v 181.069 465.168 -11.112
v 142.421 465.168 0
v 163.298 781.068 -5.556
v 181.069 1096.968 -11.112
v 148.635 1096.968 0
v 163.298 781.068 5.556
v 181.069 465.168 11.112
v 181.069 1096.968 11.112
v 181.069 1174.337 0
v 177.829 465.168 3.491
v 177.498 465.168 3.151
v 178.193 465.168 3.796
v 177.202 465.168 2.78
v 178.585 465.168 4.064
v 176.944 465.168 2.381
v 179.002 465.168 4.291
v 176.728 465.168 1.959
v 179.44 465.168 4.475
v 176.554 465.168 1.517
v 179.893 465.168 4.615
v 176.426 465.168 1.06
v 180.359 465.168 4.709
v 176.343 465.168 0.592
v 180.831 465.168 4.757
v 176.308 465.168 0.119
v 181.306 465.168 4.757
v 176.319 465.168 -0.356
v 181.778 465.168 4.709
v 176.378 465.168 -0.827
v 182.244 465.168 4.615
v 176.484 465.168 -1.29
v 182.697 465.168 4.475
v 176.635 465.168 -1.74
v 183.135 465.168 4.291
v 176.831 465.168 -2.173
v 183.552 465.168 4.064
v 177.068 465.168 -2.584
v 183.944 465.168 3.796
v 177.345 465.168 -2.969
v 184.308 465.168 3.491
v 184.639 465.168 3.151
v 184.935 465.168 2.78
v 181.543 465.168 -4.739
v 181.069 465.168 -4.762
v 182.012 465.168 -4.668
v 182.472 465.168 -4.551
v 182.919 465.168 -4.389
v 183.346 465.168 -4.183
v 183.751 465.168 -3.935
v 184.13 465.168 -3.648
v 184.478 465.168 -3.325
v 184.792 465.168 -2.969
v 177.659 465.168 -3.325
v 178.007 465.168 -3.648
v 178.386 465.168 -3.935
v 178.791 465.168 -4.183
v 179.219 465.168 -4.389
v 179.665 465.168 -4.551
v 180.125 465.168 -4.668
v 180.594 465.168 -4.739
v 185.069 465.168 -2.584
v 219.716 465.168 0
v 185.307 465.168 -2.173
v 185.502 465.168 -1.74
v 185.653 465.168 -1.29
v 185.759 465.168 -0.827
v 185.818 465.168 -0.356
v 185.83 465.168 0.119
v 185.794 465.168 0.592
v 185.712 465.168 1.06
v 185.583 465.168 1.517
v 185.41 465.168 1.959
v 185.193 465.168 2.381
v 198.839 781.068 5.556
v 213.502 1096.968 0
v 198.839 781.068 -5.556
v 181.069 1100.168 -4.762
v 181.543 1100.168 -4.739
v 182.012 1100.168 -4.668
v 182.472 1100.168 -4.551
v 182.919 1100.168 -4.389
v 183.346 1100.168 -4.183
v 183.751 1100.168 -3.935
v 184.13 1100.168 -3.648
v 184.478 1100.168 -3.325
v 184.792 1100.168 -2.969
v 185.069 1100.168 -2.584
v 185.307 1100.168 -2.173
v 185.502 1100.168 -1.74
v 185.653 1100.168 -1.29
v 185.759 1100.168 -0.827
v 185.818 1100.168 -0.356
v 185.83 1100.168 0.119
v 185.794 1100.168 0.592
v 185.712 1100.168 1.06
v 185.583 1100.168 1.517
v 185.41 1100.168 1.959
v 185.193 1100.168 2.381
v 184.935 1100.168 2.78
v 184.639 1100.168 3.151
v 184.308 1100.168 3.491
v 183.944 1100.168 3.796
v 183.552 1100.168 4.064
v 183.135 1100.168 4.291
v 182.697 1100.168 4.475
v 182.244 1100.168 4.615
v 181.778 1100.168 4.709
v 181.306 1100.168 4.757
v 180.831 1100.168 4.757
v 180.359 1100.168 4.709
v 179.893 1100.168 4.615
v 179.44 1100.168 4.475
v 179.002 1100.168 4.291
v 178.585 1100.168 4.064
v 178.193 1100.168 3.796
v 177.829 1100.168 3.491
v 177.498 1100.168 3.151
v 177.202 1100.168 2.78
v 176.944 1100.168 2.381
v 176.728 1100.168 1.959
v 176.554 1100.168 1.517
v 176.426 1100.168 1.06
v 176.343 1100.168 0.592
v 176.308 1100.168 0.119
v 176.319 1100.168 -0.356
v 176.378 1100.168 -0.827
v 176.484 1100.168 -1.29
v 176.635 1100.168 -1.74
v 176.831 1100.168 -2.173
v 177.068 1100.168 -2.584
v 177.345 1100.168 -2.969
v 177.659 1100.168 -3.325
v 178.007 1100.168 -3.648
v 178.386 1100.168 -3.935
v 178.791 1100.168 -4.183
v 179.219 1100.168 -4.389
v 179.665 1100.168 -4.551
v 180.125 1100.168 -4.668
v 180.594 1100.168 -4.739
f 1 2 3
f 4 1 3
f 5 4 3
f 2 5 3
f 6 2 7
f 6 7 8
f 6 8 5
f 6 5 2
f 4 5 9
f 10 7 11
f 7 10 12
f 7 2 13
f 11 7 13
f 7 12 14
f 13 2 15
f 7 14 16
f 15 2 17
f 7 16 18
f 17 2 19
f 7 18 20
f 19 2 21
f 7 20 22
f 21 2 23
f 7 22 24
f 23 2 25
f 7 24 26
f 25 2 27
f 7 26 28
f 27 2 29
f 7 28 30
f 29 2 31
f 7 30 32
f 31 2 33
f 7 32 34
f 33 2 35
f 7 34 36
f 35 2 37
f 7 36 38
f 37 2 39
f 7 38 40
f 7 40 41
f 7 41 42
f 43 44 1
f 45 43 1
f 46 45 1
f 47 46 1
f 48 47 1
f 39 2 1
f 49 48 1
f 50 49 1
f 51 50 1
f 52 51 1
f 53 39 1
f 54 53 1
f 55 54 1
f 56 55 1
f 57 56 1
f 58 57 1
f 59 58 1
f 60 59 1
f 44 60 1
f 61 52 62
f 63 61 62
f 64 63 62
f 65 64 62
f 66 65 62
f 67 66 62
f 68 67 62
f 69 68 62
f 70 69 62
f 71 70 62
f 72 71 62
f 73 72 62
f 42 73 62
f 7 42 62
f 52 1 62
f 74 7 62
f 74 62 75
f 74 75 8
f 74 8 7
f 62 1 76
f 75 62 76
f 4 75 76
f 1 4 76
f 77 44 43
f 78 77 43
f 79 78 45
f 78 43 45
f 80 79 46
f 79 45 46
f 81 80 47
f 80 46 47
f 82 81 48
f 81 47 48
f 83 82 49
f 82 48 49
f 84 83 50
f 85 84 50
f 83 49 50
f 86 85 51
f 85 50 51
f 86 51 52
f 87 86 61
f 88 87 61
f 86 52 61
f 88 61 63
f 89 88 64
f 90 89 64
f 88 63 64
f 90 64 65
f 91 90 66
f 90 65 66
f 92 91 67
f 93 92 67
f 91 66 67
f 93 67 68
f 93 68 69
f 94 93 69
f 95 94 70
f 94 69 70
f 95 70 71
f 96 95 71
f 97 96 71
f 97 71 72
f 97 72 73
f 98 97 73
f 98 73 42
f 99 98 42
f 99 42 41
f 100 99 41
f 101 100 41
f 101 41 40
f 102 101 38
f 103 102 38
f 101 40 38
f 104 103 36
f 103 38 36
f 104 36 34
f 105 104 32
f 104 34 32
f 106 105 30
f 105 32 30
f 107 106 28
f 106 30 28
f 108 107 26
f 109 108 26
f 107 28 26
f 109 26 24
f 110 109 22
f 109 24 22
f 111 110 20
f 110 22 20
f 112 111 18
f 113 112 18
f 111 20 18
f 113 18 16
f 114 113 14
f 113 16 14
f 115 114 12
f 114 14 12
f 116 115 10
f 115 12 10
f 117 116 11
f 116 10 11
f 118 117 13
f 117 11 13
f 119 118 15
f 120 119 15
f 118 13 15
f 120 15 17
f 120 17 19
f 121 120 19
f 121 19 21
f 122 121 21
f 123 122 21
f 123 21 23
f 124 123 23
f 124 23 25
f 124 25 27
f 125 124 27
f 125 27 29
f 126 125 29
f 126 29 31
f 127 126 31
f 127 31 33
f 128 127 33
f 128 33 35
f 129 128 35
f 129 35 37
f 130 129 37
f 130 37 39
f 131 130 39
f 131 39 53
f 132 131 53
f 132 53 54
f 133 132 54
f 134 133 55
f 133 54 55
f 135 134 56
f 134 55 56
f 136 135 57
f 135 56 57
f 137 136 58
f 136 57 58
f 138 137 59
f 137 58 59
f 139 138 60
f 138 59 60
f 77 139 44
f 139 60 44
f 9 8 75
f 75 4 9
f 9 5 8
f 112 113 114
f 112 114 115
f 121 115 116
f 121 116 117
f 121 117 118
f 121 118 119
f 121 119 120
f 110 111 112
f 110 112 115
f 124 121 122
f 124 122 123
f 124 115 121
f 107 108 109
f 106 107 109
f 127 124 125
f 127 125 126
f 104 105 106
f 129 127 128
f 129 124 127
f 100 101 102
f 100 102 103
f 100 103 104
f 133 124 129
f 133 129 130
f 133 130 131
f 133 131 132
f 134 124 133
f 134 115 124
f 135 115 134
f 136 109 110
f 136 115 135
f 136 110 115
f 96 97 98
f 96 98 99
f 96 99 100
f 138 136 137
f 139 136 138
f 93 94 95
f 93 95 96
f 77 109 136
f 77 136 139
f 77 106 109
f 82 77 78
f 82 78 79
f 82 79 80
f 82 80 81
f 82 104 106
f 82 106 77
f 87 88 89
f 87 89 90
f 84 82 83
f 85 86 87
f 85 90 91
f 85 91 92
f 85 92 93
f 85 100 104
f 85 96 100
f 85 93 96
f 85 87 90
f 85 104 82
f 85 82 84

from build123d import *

# Parameters (mm, degrees)
BOSS_EXTRUDE1_DEPTH      = 11.1125
BOSS_EXTRUDE1_DEPTH_BACK = 11.1125
SKETCH5_W                = 109.877468776
SKETCH5_H                = 283.051122129
CUT_EXTRUDE2_DEPTH       = 1193.492852366
SKETCH6_W                = 149.121482991
SKETCH6_H                = 108.921761737
CUT_EXTRUDE3_DEPTH       = 1175.662940665
SKETCH7_R                = 4.7625
CUT_EXTRUDE4_DEPTH       = 635


with BuildPart() as part:
    # Sketch1 → Boss-Extrude1 (new, two sides: drawn at the far end of the back side and taken through both)
    with BuildSketch(Plane.XY.offset(-BOSS_EXTRUDE1_DEPTH_BACK)):
        Polygon((142.42123069, 465.168027231), (219.716026672, 465.168027231), (213.502471629, 1096.967634552), (181.068628681, 1174.337215652), (148.634785732, 1096.967634552), align=None)
    extrude(amount=BOSS_EXTRUDE1_DEPTH + BOSS_EXTRUDE1_DEPTH_BACK)

    # Sketch2 → Cut-Loft1 section 0
    with BuildSketch(Plane.XZ.offset(-465.168027231)):
        with BuildLine():
            Line((142.42123069, 0), (181.068628681, 11.1125))
            Line((181.068628681, 11.1125), (219.716026672, 0))
            Line((219.716026672, 0), (222.70513775, 0))
            Line((222.70513775, 0), (222.70513775, 15.258366339))
            Line((222.70513775, 15.258366339), (137.848628215, 15.258366339))
            Line((137.848628215, 15.258366339), (137.848628215, 0))
            Line((137.848628215, 0), (142.42123069, 0))
        make_face()
    # Sketch3 → Cut-Loft1 section 1
    with BuildSketch(Plane(origin=(0, 1096.967634552, 0), x_dir=(1, 0, 0), z_dir=(0, 1, 0))):
        with BuildLine():
            Line((213.502471629, 0), (181.068628681, -11.1125))
            Line((181.068628681, -11.1125), (148.634785732, 0))
            Line((148.634785732, 0), (137.848628215, 0))
            Line((137.848628215, 0), (137.848628215, -15.258366339))
            Line((137.848628215, -15.258366339), (222.70513775, -15.258366339))
            Line((222.70513775, -15.258366339), (222.70513775, 0))
            Line((222.70513775, 0), (213.502471629, 0))
        make_face()
    cut_loft1 = loft(mode=Mode.SUBTRACT)

    # Mirror1: Cut-Loft1 across plane
    add(cut_loft1.mirror(Plane.XY), mode=Mode.SUBTRACT)

    # Sketch5 → Cut-Extrude2 (cut, through all)
    with BuildSketch(Plane(origin=(-32.103098407, 13.457832356, 93.698704331), x_dir=(0.9470206004067627, 0.045661094409327196, 0.31791043842968925), z_dir=(-0.3211728232668741, 0.1346377834927197, 0.937401026696127))):
        with Locations((219.349244299, 1139.303724701)):
            Rectangle(SKETCH5_W, SKETCH5_H)
    cut_extrude2 = extrude(amount=CUT_EXTRUDE2_DEPTH, mode=Mode.SUBTRACT)

    # Sketch6 → Cut-Extrude3 (cut, through all)
    with BuildSketch(Plane(origin=(69.458274406, 29.117370568, 202.726547902), x_dir=(0.9470206004067623, -0.045661094409327495, -0.31791043842969063), z_dir=(0.3211728232668754, 0.13463778349272, 0.9374010266961263))):
        with Locations((131.752816965, 1118.922251835)):
            Rectangle(SKETCH6_W, SKETCH6_H)
    cut_extrude3 = extrude(amount=CUT_EXTRUDE3_DEPTH, mode=Mode.SUBTRACT)

    # Mirror2: Cut-Extrude2, Cut-Extrude3 across plane
    add(cut_extrude2.mirror(Plane.XY), mode=Mode.SUBTRACT)
    add(cut_extrude3.mirror(Plane.XY), mode=Mode.SUBTRACT)

    # Sketch7 → Cut-Extrude4 (cut)
    with BuildSketch(Plane.XZ.offset(-465.168027231)):
        with Locations(Location((181.068628681, 0, 0), (0, 0, 270))):
            Circle(SKETCH7_R)
    extrude(amount=-CUT_EXTRUDE4_DEPTH, mode=Mode.SUBTRACT)


solid = part.part
